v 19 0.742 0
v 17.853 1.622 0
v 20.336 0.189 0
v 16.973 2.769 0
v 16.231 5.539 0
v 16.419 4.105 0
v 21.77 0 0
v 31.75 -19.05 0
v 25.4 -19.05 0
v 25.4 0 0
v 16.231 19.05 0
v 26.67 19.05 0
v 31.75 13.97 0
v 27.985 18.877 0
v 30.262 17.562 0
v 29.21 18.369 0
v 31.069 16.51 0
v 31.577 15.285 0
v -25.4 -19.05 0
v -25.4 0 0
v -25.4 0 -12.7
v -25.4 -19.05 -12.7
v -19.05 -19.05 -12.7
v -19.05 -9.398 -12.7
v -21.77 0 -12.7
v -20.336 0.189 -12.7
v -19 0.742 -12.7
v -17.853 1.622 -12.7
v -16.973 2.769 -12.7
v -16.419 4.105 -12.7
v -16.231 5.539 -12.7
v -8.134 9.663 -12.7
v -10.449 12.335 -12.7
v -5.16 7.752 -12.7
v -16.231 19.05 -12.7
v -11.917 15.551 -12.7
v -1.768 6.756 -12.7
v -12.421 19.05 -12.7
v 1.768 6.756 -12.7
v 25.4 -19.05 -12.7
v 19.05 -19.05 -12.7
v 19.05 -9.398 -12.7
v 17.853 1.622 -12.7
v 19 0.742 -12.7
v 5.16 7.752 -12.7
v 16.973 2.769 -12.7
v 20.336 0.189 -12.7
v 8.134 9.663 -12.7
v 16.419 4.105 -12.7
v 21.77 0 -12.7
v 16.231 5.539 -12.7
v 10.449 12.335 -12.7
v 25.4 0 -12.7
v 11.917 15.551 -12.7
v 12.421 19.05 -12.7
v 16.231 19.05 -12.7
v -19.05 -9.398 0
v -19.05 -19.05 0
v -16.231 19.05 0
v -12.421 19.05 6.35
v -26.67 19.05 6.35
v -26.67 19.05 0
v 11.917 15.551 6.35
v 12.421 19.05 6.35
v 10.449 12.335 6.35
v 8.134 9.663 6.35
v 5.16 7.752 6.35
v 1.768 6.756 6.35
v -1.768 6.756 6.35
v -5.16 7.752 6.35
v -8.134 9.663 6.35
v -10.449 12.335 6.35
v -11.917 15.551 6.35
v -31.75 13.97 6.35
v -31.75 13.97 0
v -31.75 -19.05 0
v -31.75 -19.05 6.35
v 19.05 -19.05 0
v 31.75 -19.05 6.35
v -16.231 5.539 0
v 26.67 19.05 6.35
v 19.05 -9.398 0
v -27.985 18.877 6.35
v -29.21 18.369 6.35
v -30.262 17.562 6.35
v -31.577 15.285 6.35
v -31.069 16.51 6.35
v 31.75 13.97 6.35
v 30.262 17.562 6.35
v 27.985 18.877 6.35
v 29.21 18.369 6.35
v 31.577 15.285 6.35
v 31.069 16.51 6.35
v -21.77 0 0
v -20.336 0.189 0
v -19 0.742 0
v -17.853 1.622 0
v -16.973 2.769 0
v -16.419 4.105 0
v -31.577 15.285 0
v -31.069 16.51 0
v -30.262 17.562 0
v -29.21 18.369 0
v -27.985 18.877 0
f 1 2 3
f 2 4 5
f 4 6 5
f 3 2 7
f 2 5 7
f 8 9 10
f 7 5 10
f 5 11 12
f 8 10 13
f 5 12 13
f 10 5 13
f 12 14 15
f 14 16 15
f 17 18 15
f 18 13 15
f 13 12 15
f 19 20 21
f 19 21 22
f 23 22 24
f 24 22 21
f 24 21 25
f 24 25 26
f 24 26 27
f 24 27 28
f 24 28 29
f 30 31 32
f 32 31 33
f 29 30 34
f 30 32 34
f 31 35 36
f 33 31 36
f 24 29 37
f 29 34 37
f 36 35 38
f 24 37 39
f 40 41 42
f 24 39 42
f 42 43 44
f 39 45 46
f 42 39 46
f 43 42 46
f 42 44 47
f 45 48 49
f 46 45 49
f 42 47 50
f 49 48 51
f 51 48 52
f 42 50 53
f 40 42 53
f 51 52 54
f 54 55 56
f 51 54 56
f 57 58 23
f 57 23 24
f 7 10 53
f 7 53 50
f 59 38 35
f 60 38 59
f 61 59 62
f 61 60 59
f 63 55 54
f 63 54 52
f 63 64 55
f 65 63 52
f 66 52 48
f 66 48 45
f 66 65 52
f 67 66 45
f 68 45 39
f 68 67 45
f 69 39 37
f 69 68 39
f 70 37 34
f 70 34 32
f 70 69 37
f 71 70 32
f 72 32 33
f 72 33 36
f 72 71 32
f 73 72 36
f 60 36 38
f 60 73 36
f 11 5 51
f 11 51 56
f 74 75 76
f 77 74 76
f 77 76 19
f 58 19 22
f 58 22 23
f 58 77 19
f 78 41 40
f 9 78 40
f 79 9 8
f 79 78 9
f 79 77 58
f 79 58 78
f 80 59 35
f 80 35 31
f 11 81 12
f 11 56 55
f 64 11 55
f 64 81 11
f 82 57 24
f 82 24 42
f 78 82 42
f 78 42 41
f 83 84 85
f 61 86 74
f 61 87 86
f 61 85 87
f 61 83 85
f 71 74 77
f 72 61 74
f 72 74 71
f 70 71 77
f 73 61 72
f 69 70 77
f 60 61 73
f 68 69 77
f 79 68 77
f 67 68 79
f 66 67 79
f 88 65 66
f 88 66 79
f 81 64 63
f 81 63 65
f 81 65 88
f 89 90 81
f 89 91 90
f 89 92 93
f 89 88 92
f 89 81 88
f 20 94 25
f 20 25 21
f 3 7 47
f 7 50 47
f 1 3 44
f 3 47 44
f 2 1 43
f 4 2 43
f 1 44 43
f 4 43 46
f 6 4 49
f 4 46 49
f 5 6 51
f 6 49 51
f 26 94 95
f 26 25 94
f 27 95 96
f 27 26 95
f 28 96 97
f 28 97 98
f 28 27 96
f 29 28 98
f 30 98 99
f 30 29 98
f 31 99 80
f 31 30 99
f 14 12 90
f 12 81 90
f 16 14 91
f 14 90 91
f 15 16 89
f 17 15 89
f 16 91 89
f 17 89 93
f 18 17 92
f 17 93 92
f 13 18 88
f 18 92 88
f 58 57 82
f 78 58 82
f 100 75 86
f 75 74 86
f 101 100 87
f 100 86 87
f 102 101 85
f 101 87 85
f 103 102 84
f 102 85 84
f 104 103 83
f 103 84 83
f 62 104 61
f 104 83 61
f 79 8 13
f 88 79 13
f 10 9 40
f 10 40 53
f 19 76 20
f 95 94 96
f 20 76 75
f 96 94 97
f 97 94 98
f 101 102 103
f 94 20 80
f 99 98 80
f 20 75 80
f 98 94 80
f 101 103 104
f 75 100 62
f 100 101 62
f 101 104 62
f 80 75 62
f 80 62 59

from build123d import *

# Parameters (mm, degrees)
F1_DEPTH = 6.35
F3_DEPTH = 12.7
F4_R     = 5.538906
F5_R     = 5.08


with BuildPart() as f1:
    # F0 (on Top) → F1 (new body)
    with BuildSketch(Plane.XY):
        with BuildLine():
            Line((-12.4206, 19.05), (-31.75, 19.05))
            Line((-31.75, 19.05), (-31.75, -19.05))
            Line((-31.75, -19.05), (31.75, -19.05))
            Line((31.75, -19.05), (31.75, 19.05))
            Line((31.75, 19.05), (12.4206, 19.05))
            ThreePointArc((12.4206, 19.05), (0, 6.6294), (-12.4206, 19.05))
        make_face()
    extrude(amount=F1_DEPTH)

    # F2 (on Top) → F3 (join)
    with BuildSketch(Plane.XY):
        with BuildLine():
            Line((-12.4206, 19.05), (-16.2306, 19.05))
            Line((-16.2306, 19.05), (-16.2306, 0))
            Line((-16.2306, 0), (-25.4, 0))
            Line((-25.4, 0), (-25.4, -19.05))
            Line((-25.4, -19.05), (-19.05, -19.05))
            Line((-19.05, -19.05), (-19.05, -9.398))
            Line((-19.05, -9.398), (19.05, -9.398))
            Line((19.05, -9.398), (19.05, -19.05))
            Line((19.05, -19.05), (25.4, -19.05))
            Line((25.4, -19.05), (25.4, 0))
            Line((25.4, 0), (16.2306, 0))
            Line((16.2306, 0), (16.2306, 19.05))
            Line((16.2306, 19.05), (12.4206, 19.05))
            ThreePointArc((12.4206, 19.05), (0, 6.6294), (-12.4206, 19.05))
        make_face()
    extrude(amount=-F3_DEPTH)

    # F4
    f4_edges = [f1.edges().sort_by_distance(p)[0] for p in [
        (16.2306, 0, -6.35),
        (-16.2306, 0, -6.35),
    ]]
    fillet(f4_edges, radius=F4_R)

    # F5
    f5_edges = [f1.edges().sort_by_distance(p)[0] for p in [
        (31.75, 19.05, 3.175),
        (-31.75, 19.05, 3.175),
    ]]
    fillet(f5_edges, radius=F5_R)


solid = f1.part
